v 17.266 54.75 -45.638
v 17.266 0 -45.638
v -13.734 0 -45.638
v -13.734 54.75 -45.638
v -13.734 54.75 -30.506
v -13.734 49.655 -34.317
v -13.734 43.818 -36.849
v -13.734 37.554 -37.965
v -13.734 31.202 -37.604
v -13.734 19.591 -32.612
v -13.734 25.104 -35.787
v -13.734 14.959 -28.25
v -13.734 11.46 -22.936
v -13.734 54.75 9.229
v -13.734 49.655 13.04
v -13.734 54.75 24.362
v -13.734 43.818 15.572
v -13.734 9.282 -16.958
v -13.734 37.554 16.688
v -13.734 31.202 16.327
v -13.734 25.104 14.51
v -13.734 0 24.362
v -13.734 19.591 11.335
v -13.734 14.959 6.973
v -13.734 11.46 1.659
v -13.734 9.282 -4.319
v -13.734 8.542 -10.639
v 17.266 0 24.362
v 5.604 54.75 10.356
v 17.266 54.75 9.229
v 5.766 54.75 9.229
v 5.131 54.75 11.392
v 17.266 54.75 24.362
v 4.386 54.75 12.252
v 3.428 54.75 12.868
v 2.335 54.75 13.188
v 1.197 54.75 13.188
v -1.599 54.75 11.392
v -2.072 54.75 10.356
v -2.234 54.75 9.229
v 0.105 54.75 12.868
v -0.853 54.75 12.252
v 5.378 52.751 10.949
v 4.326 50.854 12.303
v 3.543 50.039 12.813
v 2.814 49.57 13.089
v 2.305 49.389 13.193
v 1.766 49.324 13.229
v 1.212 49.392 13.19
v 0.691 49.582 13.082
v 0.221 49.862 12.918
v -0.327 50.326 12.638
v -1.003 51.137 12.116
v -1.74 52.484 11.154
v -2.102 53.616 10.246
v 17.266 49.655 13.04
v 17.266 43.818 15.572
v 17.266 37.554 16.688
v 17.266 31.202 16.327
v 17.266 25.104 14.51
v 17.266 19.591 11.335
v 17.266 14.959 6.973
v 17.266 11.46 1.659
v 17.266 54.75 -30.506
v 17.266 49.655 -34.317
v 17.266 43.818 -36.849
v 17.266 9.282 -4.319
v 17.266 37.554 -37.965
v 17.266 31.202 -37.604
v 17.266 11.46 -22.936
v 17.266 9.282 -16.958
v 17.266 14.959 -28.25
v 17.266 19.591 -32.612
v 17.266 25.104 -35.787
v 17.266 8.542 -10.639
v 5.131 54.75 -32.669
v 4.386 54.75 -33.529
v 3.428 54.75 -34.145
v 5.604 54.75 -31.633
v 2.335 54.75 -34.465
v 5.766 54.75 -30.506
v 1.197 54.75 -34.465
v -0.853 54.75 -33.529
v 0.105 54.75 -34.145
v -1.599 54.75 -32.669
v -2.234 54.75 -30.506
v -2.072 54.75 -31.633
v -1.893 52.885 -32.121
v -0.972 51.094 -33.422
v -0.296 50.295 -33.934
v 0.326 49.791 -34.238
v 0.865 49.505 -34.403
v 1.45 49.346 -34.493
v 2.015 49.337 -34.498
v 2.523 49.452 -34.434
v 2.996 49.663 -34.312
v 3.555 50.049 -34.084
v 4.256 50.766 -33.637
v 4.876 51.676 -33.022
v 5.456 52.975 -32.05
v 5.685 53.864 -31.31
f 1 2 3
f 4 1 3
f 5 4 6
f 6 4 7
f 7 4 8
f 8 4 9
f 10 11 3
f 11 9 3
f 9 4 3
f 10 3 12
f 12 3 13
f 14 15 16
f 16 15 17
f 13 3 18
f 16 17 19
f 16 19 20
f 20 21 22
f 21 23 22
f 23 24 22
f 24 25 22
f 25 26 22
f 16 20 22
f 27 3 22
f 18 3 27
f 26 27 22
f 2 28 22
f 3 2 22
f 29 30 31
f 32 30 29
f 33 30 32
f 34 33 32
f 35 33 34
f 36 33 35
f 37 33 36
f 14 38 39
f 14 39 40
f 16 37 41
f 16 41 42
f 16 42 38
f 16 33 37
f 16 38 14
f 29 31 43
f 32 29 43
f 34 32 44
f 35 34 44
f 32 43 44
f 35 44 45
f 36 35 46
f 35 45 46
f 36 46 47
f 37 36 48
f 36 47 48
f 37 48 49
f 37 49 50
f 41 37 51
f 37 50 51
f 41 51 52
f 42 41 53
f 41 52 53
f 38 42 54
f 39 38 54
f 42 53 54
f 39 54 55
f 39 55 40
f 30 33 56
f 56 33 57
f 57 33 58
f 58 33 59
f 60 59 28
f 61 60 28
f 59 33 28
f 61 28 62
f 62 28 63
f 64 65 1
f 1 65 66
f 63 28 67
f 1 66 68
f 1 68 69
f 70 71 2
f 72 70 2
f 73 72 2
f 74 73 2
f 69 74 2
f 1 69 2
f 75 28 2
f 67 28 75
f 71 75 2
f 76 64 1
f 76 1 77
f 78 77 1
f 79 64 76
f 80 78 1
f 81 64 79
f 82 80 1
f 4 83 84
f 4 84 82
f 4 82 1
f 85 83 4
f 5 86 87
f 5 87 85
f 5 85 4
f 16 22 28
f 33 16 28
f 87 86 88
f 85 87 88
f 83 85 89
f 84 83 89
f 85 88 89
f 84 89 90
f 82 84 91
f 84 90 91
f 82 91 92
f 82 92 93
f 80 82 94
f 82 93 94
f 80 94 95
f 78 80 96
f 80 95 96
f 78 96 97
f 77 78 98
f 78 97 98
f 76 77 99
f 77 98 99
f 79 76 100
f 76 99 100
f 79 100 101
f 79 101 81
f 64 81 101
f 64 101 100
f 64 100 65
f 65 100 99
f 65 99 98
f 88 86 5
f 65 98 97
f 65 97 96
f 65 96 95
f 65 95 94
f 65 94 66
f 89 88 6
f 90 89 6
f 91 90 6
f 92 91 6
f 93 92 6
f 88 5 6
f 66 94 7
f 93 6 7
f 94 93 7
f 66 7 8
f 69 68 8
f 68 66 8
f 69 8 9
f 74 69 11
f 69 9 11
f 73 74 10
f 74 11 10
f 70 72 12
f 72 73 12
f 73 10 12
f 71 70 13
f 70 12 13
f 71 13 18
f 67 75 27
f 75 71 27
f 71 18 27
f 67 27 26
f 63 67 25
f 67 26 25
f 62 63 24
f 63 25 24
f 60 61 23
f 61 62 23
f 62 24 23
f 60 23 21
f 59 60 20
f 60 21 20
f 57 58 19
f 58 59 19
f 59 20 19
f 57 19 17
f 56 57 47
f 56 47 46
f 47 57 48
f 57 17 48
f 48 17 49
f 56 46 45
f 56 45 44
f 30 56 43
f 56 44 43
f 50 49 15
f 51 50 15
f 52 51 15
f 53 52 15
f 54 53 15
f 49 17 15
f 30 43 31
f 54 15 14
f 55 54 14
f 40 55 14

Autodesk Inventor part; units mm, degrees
ref_plane "YZ Plane" through (0, 0, 0) normal (1, 0, 0) x (0, 1, 0)
ref_plane "XZ Plane" through (0, 0, 0) normal (0, 1, 0) x (-1, 0, 0)
ref_plane "XY Plane" through (0, 0, 0) normal (0, 0, 1) x (1, 0, 0)
sketch "Sketch1" plane through (0, 0, 0) normal (0, 1, 0) x (-1, 0, 0)
  line L0 (13.7338, 24.3615) -> (-17.2662, 24.3615)
  line L1 (-17.2662, 24.3615) -> (-17.2662, -45.6385)
  line L2 (-17.2662, -45.6385) -> (13.7338, -45.6385)
  line L3 (13.7338, -45.6385) -> (13.7338, 24.3615)
  point P0 (0, 0)
  dimension "d0" = 31
  dimension "d1" = 70
extrude "Extrusion1" add sketch "Sketch1" along normal blind 54.75
sketch "Sketch2" plane through (17.2662, 0, 24.3615) normal (1, 0, 0) x (0, 0, -1)
  circle A0 centre (35, 35.9173) radius 27.375
  line L0 (0, 54.75) -> (70, 54.75) construction
  point P0 (24.3615, 0)
  point P1 (35, 54.75)
  dimension "d4" = 54.75
hole "Hole1" at (17.2662, 35.9173, -10.6385) direction (-1, 0, 0) diameter 54.75 end through all
sketch "Sketch3" plane through (0, 0, 0) normal (0, -1, 0) x (1, 0, 0)
  point P0 (0, 0)
sketch "Sketch4" plane through (0, 54.75, 0) normal (0, 1, 0) x (1, 0, 0)
  line L0 (-13.7338, -9.229) -> (17.2662, -9.229) construction
  line L1 (17.2662, -9.229) -> (-13.7338, -9.229) construction
  circle A0 centre (1.7662, -9.229) radius 4 construction
  point P0 (0, 0)
  dimension "d12" = 8
sketch "Sketch5" plane through (0, 54.75, 0) normal (0, 1, 0) x (1, 0, 0)
  line L0 (17.2662, 30.506) -> (-13.7338, 30.506) construction
  line L1 (-13.7338, 30.506) -> (17.2662, 30.506) construction
  circle A0 centre (1.7662, 30.506) radius 4 construction
  point P0 (0, 0)
  dimension "d13" = 8
hole "Hole2" at (1.7662, 54.75, 9.229) direction (0, -1, 0) diameter 8 depth 8 tip angle 118
hole "Hole3" at (1.7662, 54.75, -30.506) direction (0, -1, 0) diameter 8 depth 8 tip angle 118
sketch "Sketch6" plane through (0, 54.75, 0) normal (0, 1, 0) x (1, 0, 0)
  point P0 (0, 0)
properties part number "Noke_base"
